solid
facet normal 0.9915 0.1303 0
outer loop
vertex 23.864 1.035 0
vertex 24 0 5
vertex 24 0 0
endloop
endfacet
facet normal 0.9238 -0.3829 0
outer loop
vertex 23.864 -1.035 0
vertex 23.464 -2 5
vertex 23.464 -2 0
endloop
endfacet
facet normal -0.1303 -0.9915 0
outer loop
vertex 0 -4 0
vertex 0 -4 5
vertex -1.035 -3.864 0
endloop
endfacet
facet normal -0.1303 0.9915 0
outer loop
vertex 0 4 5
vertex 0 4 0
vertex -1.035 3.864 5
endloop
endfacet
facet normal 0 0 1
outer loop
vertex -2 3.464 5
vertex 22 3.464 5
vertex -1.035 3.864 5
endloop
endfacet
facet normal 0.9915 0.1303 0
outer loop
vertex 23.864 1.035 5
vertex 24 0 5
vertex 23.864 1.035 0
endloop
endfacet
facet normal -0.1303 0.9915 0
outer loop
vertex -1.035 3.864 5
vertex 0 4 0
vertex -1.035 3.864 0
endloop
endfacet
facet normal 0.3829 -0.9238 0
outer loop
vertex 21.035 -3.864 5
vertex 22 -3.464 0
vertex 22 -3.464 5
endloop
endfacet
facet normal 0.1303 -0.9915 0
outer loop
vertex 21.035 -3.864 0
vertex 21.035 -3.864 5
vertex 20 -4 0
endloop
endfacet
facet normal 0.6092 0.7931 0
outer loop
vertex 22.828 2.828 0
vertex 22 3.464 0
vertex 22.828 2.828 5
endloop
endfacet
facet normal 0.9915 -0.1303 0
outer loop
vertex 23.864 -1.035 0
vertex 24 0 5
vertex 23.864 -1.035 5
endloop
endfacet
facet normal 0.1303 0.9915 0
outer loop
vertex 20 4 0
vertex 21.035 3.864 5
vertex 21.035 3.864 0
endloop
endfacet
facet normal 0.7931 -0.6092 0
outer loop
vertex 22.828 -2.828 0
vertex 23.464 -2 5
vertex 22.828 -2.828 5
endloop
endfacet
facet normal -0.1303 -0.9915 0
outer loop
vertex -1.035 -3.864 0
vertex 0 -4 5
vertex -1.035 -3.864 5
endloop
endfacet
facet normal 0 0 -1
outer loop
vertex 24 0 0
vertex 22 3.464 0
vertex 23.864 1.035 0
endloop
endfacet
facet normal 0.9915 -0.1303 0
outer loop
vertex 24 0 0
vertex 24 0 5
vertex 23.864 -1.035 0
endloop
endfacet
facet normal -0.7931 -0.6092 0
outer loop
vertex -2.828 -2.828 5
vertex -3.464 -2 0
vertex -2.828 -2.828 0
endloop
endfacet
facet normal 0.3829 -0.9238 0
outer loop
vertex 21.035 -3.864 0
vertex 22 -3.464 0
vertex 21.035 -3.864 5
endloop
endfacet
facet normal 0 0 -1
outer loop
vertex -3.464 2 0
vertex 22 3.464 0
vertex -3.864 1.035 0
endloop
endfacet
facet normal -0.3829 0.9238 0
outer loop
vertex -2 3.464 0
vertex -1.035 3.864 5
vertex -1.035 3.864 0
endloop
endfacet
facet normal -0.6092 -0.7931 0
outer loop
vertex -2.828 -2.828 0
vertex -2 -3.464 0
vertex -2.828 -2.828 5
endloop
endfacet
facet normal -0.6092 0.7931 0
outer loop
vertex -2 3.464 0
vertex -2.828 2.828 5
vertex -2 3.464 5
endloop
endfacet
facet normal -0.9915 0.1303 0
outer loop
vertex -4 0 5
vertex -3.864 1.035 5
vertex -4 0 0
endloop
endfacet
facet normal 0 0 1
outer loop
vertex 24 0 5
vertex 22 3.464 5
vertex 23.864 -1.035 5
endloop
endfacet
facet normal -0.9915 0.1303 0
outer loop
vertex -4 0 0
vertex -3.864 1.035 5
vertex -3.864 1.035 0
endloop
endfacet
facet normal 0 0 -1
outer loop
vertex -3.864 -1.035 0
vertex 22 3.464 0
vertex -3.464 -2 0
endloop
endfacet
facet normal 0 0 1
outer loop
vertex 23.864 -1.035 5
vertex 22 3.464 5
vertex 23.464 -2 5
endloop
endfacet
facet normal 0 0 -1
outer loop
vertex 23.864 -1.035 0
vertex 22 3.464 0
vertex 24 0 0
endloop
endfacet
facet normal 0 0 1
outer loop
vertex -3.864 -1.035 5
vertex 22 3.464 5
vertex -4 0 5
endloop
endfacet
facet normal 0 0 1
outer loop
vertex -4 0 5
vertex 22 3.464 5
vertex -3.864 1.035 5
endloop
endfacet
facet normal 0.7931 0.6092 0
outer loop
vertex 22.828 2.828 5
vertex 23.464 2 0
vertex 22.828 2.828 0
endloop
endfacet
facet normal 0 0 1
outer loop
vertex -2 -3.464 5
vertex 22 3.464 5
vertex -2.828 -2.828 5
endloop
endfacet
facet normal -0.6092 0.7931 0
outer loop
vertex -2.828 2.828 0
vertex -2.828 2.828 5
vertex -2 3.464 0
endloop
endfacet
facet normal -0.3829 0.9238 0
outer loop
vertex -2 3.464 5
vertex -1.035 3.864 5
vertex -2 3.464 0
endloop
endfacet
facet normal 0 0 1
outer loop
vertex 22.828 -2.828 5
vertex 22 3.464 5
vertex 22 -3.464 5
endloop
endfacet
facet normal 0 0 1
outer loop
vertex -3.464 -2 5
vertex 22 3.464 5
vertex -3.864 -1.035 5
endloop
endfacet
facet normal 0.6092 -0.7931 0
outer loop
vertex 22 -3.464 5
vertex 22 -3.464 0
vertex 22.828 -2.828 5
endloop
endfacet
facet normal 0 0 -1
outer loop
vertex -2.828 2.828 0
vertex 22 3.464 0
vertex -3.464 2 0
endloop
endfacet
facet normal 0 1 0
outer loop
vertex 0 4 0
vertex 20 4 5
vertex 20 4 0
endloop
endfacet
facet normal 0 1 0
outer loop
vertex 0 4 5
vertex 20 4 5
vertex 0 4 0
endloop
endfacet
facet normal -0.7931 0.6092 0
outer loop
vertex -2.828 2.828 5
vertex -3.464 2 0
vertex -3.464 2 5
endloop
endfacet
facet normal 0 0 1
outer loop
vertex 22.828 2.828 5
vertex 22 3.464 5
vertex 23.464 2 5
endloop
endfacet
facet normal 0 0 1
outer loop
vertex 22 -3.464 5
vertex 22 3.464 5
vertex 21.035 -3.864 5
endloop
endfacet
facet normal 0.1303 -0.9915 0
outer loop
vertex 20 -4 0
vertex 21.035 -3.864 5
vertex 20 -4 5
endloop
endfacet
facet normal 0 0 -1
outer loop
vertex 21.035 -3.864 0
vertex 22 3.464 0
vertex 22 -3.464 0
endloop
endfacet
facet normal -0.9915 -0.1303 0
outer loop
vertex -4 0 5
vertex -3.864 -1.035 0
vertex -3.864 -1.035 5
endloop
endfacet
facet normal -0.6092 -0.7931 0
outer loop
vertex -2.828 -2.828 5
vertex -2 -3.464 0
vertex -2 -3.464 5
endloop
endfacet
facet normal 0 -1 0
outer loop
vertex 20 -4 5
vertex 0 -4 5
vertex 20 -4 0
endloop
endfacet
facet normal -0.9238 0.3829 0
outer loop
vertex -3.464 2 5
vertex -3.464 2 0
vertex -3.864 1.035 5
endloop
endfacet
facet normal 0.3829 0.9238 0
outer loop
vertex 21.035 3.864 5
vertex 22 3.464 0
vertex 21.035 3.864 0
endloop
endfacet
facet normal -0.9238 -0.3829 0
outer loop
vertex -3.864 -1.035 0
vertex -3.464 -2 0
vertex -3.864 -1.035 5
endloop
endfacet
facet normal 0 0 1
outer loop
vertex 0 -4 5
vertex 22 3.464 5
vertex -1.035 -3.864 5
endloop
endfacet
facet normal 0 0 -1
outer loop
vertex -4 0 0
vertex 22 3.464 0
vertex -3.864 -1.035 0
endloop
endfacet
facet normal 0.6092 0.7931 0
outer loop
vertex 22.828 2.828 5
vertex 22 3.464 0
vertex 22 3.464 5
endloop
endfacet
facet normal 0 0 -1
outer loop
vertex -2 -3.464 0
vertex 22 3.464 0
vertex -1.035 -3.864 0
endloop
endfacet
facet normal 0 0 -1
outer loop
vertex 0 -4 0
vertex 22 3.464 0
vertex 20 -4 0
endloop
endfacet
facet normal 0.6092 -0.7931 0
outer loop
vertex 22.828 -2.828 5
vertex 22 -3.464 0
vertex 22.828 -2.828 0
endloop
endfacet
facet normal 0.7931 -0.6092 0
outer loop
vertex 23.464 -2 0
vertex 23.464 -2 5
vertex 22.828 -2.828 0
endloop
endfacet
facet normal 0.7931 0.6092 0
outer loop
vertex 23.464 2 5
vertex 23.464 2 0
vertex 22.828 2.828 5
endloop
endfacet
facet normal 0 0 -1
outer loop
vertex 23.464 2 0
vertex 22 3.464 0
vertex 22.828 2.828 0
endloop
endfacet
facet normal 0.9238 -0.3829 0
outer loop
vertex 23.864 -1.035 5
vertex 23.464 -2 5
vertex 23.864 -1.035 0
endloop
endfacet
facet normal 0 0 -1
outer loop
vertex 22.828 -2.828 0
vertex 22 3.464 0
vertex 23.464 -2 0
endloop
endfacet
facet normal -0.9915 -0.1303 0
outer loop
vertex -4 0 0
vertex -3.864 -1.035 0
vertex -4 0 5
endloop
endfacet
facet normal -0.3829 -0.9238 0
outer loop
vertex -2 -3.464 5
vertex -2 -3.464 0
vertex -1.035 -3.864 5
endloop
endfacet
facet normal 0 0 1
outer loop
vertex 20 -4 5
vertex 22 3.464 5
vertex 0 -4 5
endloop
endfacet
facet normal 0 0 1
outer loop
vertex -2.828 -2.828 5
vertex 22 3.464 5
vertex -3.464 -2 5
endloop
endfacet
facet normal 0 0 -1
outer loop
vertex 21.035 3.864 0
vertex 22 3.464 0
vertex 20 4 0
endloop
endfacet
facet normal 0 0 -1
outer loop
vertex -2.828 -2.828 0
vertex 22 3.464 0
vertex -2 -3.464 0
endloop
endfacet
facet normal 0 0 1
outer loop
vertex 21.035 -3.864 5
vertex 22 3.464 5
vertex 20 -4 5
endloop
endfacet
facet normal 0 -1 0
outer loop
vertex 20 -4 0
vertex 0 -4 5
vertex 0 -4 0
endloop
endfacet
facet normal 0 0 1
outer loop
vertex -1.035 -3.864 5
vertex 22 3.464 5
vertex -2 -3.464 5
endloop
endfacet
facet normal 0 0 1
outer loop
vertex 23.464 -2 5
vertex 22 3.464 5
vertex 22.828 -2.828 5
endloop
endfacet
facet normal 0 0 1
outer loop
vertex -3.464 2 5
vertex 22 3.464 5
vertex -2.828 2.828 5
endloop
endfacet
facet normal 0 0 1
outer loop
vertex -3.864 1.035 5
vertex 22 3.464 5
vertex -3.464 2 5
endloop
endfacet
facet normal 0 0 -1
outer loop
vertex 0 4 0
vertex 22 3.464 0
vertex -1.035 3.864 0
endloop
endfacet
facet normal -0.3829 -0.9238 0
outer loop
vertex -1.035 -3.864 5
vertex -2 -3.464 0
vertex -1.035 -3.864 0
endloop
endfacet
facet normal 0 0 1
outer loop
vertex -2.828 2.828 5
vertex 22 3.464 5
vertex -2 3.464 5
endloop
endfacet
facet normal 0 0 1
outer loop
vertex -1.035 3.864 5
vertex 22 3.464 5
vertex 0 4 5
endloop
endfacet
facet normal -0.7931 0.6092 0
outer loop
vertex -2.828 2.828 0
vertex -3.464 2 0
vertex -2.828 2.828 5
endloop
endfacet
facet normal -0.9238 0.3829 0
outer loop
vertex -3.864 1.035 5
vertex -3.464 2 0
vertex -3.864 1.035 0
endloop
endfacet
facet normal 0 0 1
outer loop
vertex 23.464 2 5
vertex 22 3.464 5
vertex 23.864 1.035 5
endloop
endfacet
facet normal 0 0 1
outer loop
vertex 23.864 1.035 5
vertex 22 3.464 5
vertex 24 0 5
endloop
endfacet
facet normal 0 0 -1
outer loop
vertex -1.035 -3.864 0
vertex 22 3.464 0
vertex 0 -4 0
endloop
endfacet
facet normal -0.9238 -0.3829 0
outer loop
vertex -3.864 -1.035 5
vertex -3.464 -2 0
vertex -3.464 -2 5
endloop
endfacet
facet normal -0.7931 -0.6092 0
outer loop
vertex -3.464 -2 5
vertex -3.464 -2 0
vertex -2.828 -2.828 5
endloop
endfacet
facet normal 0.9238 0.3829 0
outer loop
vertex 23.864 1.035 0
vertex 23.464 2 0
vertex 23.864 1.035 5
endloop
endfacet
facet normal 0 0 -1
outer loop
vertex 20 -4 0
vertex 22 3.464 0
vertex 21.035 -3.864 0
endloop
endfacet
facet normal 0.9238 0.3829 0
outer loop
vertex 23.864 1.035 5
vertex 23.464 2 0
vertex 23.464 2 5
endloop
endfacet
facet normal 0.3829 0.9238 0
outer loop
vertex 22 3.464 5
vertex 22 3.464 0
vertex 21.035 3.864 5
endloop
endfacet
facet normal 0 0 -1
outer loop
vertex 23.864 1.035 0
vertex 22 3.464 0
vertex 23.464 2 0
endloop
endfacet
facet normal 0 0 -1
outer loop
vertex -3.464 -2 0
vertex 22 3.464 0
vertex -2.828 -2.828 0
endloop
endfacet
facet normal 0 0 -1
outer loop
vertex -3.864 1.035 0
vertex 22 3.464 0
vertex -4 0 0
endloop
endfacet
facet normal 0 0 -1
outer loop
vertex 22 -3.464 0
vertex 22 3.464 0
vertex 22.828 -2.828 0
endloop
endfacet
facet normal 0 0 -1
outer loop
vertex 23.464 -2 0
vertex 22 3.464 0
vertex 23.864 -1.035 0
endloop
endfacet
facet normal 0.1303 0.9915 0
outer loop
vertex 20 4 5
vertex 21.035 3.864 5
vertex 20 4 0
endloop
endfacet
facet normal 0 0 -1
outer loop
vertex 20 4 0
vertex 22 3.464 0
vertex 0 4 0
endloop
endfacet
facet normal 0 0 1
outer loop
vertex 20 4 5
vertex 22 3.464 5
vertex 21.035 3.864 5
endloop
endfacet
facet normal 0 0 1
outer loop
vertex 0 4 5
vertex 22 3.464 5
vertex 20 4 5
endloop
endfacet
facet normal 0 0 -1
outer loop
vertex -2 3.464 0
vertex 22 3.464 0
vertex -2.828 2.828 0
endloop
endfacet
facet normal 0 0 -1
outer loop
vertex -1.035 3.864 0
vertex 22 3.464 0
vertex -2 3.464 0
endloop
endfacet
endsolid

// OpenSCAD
hull() {
  cylinder(h = 5, r = 4, $fn = 24);
  translate([20, 0, 0]) cylinder(h = 5, r = 4, $fn = 24);
}
